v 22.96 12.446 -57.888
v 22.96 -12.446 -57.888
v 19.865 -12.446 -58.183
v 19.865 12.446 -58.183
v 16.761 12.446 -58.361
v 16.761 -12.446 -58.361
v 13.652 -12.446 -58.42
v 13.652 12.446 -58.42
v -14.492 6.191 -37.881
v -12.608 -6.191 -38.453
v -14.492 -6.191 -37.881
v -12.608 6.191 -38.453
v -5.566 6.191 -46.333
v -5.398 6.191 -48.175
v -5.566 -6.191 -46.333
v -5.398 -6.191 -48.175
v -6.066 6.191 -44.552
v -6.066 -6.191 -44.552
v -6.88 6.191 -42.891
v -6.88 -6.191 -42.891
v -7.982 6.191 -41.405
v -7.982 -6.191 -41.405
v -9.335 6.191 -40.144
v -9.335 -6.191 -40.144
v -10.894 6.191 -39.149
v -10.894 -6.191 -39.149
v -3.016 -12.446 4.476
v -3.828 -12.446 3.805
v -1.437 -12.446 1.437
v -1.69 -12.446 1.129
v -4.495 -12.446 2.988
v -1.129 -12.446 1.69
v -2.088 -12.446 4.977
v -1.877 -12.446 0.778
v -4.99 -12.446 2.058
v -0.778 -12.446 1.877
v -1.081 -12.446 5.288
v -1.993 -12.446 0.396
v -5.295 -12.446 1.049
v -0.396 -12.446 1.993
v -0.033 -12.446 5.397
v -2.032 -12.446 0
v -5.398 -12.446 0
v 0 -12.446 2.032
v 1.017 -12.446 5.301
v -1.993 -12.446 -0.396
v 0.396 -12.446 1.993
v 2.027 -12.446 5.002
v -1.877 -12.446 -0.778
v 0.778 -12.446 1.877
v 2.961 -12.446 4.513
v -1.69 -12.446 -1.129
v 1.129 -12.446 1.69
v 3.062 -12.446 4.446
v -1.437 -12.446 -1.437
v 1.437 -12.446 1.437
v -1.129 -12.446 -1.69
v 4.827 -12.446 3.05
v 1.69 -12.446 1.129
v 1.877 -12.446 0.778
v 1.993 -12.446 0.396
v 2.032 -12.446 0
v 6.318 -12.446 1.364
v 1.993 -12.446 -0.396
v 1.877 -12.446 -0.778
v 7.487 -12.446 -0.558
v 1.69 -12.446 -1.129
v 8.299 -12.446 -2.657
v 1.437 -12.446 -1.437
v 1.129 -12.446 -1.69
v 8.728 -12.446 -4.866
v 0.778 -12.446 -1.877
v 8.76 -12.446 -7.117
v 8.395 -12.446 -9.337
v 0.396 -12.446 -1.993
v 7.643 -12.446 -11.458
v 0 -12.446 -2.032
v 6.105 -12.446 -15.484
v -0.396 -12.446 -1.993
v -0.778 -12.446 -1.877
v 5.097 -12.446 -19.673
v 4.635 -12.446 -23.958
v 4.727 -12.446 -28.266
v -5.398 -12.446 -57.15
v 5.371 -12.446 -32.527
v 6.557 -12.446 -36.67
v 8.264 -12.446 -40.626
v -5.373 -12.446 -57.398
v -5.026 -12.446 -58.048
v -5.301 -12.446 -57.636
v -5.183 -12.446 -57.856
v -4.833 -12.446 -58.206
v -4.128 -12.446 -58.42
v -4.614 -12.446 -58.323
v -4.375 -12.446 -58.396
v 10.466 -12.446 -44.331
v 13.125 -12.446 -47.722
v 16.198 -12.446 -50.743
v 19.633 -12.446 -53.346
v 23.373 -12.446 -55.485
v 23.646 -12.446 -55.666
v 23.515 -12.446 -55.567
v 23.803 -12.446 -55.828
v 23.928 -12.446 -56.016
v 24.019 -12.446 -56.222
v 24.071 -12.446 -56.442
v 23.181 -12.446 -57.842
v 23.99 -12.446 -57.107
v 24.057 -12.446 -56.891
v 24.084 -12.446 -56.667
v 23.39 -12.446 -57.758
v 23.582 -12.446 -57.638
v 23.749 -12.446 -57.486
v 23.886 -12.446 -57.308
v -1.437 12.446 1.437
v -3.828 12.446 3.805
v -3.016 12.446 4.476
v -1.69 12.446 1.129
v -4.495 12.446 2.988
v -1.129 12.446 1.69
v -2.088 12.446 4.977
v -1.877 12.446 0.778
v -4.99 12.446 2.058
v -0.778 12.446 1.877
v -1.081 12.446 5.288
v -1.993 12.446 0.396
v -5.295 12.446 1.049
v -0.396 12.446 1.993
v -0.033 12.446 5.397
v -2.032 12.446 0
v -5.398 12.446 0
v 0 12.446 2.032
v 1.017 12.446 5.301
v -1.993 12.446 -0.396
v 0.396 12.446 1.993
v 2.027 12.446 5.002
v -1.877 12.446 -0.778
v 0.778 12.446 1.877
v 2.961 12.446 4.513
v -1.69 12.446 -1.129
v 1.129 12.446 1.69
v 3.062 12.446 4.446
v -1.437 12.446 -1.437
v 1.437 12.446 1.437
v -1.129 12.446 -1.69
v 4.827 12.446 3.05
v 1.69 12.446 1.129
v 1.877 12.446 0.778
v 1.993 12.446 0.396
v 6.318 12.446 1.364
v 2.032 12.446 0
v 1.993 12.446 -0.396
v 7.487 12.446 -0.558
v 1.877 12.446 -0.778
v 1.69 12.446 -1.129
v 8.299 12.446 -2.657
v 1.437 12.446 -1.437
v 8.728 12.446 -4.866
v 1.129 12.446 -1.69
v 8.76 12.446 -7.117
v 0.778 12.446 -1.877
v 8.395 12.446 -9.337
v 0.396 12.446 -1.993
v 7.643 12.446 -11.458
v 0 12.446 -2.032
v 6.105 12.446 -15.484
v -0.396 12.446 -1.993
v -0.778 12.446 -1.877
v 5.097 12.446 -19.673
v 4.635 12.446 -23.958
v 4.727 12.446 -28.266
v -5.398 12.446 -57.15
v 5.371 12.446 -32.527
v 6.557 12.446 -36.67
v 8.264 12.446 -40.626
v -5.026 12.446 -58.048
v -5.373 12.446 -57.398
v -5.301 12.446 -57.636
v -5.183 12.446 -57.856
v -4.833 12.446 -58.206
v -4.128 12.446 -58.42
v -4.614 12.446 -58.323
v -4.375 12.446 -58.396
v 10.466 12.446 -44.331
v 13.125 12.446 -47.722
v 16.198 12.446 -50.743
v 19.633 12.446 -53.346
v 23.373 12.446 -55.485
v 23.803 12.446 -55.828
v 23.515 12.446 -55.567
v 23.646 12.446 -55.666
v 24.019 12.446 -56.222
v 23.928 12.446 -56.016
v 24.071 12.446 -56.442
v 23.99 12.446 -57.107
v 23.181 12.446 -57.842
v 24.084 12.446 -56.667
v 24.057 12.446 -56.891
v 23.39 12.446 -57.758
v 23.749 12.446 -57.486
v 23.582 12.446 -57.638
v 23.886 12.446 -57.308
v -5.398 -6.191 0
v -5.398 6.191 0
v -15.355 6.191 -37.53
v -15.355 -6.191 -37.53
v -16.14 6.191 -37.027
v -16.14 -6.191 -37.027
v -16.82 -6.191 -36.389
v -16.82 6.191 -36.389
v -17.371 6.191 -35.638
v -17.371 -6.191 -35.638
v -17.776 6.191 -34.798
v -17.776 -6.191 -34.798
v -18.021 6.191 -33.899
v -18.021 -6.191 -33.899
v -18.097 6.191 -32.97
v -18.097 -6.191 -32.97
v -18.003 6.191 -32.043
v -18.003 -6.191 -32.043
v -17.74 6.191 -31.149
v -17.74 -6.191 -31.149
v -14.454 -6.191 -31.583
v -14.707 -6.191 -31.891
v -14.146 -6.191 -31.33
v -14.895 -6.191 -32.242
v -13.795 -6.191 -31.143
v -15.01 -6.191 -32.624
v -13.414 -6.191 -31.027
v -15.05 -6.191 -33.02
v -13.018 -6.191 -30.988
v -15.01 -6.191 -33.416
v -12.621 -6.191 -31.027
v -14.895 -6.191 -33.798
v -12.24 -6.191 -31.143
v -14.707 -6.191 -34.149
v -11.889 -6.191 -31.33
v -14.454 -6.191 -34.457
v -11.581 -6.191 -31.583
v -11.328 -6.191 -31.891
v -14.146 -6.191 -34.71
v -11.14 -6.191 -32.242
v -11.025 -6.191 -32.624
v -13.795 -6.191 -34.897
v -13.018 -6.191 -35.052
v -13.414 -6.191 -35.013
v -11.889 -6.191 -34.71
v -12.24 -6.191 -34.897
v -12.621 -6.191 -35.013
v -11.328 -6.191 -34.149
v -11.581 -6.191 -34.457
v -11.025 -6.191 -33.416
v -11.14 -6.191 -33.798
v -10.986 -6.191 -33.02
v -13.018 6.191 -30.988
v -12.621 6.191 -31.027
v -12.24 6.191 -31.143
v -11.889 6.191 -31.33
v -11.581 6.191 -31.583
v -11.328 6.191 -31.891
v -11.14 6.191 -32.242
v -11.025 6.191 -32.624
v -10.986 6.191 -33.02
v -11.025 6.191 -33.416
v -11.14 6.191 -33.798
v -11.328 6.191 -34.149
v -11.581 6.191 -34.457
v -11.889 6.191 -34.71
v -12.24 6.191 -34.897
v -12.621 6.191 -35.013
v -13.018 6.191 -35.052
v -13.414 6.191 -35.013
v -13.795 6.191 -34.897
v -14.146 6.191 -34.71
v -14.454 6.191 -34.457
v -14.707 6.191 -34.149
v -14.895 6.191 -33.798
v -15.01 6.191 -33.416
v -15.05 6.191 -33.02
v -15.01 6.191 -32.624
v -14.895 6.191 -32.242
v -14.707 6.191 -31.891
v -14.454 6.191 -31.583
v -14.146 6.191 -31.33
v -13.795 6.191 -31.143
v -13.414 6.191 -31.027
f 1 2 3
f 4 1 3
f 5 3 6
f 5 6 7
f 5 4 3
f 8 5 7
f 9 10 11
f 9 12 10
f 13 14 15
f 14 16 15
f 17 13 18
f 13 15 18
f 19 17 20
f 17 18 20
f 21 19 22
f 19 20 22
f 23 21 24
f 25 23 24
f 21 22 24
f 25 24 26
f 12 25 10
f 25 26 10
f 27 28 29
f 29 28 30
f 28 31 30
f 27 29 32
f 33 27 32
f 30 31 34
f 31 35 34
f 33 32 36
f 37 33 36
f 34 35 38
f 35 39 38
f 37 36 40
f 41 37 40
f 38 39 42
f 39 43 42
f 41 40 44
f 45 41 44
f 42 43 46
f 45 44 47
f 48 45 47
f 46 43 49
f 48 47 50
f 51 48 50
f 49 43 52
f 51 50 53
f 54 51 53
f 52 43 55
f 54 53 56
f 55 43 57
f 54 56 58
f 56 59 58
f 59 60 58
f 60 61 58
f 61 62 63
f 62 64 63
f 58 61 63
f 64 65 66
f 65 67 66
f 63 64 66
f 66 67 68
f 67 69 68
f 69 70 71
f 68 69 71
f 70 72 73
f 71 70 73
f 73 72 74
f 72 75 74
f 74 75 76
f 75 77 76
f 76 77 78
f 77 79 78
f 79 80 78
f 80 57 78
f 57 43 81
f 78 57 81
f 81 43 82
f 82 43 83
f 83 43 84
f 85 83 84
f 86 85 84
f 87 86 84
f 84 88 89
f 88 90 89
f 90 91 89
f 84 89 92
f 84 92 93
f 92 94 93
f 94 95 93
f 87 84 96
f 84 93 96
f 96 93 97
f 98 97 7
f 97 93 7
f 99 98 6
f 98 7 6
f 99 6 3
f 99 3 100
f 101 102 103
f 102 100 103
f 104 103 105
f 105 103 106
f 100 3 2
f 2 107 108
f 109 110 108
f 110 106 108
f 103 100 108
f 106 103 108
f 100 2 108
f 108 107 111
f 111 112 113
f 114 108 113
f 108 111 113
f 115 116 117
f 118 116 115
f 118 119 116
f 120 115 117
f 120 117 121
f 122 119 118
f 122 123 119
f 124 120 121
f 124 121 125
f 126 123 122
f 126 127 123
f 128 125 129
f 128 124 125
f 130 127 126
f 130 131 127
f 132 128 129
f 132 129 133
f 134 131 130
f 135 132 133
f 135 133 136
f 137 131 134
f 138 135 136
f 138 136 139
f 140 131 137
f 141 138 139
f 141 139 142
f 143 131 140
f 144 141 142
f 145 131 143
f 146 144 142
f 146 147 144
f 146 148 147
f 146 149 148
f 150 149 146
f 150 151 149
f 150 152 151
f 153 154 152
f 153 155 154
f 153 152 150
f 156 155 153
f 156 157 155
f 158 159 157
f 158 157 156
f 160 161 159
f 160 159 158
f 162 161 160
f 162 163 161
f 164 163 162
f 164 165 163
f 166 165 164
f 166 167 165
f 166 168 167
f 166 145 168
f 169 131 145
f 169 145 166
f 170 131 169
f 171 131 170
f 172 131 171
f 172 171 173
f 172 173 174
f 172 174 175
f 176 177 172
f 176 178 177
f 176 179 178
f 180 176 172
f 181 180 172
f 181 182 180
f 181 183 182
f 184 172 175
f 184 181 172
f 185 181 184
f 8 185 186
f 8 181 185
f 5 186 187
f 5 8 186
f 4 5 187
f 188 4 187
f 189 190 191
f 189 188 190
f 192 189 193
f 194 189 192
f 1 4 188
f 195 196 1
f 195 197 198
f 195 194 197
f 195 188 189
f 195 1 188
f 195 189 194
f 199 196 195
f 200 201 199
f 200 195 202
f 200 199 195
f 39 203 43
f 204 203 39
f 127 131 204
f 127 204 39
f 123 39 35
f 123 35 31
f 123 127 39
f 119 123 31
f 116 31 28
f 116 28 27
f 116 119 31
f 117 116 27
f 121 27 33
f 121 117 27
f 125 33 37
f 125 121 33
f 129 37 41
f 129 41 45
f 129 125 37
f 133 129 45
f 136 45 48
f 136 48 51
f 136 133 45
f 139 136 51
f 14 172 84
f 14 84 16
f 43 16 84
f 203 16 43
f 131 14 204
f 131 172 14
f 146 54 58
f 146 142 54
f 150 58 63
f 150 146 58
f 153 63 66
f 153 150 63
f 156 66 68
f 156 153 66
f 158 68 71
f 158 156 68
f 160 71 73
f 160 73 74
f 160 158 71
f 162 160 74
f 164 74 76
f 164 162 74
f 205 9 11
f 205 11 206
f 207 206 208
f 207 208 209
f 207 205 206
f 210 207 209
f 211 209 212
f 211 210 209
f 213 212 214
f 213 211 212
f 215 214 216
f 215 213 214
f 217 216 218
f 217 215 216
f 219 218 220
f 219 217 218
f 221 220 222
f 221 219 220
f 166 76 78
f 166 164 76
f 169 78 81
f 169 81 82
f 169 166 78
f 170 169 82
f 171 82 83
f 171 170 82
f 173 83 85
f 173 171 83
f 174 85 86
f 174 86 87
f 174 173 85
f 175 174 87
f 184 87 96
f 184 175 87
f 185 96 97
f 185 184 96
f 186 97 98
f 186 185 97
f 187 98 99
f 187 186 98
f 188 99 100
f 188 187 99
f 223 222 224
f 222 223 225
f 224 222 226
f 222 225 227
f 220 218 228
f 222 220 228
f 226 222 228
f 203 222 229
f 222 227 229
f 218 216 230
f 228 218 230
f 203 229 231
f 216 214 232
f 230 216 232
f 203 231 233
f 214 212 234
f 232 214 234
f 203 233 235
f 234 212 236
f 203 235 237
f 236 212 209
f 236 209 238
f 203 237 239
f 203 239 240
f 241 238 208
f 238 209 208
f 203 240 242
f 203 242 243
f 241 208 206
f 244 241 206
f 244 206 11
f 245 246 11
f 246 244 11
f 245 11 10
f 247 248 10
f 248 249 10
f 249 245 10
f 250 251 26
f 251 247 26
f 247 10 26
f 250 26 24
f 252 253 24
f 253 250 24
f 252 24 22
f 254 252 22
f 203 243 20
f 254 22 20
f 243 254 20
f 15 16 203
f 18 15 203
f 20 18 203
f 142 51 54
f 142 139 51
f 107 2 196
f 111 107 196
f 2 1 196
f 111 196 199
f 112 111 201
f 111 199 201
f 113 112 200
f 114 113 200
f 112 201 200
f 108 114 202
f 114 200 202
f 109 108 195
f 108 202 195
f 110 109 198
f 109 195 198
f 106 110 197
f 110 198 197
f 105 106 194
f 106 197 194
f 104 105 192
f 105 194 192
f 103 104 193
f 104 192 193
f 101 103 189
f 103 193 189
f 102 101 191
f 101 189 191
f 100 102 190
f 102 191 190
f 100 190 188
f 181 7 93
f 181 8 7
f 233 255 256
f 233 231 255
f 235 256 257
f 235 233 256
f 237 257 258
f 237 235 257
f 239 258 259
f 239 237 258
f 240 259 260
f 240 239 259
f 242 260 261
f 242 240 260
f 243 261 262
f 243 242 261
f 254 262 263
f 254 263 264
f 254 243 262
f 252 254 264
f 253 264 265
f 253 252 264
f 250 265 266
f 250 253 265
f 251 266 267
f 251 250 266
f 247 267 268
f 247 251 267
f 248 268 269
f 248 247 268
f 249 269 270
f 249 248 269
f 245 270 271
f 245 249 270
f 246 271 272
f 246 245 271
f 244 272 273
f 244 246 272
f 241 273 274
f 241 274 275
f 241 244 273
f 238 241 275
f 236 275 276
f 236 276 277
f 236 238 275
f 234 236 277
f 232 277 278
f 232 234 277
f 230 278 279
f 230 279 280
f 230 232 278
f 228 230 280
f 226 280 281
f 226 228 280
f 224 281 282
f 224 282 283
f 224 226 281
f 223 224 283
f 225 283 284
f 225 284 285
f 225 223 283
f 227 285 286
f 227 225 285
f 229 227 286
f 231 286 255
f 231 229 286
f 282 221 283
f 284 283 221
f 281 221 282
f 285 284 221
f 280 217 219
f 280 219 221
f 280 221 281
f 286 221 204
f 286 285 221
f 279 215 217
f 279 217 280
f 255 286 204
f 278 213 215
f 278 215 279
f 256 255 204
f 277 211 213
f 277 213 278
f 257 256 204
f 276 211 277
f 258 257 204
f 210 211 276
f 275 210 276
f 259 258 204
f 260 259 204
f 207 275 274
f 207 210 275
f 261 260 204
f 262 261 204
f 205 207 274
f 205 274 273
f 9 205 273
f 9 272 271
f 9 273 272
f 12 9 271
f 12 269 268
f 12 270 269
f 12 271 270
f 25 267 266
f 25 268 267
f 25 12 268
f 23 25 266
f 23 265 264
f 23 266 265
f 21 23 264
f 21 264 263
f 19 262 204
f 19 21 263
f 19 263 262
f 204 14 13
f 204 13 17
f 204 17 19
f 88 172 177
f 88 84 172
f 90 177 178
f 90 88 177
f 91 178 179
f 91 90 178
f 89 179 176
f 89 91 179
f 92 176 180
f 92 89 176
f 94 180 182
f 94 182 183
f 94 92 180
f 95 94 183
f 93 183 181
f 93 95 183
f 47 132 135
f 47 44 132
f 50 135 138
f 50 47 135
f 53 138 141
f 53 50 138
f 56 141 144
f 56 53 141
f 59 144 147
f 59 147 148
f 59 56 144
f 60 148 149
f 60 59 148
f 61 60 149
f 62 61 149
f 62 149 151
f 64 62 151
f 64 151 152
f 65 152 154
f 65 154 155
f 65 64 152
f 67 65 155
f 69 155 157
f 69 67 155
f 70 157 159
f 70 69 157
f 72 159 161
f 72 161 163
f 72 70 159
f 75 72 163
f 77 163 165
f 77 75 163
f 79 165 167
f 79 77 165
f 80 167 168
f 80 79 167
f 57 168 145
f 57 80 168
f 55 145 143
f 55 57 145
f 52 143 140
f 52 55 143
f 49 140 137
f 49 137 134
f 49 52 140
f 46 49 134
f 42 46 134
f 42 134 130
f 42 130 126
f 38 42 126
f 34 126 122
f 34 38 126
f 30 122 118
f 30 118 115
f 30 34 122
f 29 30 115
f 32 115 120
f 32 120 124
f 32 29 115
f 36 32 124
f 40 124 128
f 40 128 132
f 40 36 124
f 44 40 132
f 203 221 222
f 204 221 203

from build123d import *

# Parameters (mm, degrees)
SKETCH1_R           = 2.032
BOSS_EXTRUDE1_DEPTH = 12.446
FILLET2_R           = 12.7
SKETCH2_R           = 2.032
BOSS_EXTRUDE2_DEPTH = 6.19125
FILLET7_R           = 10.16
FILLET8_R           = 1.27


with BuildPart() as part:
    # Sketch1 → Boss-Extrude1 (new, symmetric)
    with BuildSketch(Plane(origin=(0, 0, 0), x_dir=(1, 0, 0), z_dir=(0, 1, 0))):
        with BuildLine():
            Line((2.960934797, -4.512856233), (13.6525, 2.501997733))
            ThreePointArc((13.6525, 2.501997733), (5.644977773, 33.686754268), (27.6225, 57.215416983))
            ThreePointArc((27.6225, 57.215416983), (20.663418632, 58.118296563), (13.6525, 58.42))
            Line((13.6525, 58.42), (-5.3975, 58.42))
            Line((-5.3975, 58.42), (-5.3975, 0))
            ThreePointArc((-5.3975, 0), (-2.56430894, -4.749455328), (2.960934797, -4.512856233))
        make_face()
        with Locations(Location((0, 0, 0), (0, 0, 270))):
            Circle(SKETCH1_R, mode=Mode.SUBTRACT)
    extrude(amount=BOSS_EXTRUDE1_DEPTH, both=True)

    # Fillet2
    fillet2_edges = [part.edges().sort_by_distance(p)[0] for p in [
        (13.6525, 0, -2.501997733),
    ]]
    fillet(fillet2_edges, radius=FILLET2_R)

    # Sketch2 → Boss-Extrude2 (add, symmetric)
    with BuildSketch(Plane(origin=(0, 0, 0), x_dir=(1, 0, 0), z_dir=(0, 1, 0))):
        with BuildLine():
            Line((-5.3975, 40.64), (-14.492103254, 37.881269921))
            ThreePointArc((-14.492103254, 37.881269921), (-17.59286619, 35.227356842), (-17.740238368, 31.148598838))
            Line((-17.740238368, 31.148598838), (-5.3975, 0))
            Line((-5.3975, 0), (-5.3975, 40.64))
        make_face()
        with Locations(Location((-13.0175, 33.02, 0), (0, 0, 270))):
            Circle(SKETCH2_R, mode=Mode.SUBTRACT)
    extrude(amount=BOSS_EXTRUDE2_DEPTH, both=True)

    # Fillet7
    fillet7_edges = [part.edges().sort_by_distance(p)[0] for p in [
        (-5.3975, 0, -40.64),
    ]]
    fillet(fillet7_edges, radius=FILLET7_R)

    # Fillet8
    fillet8_edges = [part.edges().sort_by_distance(p)[0] for p in [
        (-5.3975, 0, -58.42),
        (27.6225, 0, -57.215416983),
    ]]
    fillet(fillet8_edges, radius=FILLET8_R)


solid = part.part
